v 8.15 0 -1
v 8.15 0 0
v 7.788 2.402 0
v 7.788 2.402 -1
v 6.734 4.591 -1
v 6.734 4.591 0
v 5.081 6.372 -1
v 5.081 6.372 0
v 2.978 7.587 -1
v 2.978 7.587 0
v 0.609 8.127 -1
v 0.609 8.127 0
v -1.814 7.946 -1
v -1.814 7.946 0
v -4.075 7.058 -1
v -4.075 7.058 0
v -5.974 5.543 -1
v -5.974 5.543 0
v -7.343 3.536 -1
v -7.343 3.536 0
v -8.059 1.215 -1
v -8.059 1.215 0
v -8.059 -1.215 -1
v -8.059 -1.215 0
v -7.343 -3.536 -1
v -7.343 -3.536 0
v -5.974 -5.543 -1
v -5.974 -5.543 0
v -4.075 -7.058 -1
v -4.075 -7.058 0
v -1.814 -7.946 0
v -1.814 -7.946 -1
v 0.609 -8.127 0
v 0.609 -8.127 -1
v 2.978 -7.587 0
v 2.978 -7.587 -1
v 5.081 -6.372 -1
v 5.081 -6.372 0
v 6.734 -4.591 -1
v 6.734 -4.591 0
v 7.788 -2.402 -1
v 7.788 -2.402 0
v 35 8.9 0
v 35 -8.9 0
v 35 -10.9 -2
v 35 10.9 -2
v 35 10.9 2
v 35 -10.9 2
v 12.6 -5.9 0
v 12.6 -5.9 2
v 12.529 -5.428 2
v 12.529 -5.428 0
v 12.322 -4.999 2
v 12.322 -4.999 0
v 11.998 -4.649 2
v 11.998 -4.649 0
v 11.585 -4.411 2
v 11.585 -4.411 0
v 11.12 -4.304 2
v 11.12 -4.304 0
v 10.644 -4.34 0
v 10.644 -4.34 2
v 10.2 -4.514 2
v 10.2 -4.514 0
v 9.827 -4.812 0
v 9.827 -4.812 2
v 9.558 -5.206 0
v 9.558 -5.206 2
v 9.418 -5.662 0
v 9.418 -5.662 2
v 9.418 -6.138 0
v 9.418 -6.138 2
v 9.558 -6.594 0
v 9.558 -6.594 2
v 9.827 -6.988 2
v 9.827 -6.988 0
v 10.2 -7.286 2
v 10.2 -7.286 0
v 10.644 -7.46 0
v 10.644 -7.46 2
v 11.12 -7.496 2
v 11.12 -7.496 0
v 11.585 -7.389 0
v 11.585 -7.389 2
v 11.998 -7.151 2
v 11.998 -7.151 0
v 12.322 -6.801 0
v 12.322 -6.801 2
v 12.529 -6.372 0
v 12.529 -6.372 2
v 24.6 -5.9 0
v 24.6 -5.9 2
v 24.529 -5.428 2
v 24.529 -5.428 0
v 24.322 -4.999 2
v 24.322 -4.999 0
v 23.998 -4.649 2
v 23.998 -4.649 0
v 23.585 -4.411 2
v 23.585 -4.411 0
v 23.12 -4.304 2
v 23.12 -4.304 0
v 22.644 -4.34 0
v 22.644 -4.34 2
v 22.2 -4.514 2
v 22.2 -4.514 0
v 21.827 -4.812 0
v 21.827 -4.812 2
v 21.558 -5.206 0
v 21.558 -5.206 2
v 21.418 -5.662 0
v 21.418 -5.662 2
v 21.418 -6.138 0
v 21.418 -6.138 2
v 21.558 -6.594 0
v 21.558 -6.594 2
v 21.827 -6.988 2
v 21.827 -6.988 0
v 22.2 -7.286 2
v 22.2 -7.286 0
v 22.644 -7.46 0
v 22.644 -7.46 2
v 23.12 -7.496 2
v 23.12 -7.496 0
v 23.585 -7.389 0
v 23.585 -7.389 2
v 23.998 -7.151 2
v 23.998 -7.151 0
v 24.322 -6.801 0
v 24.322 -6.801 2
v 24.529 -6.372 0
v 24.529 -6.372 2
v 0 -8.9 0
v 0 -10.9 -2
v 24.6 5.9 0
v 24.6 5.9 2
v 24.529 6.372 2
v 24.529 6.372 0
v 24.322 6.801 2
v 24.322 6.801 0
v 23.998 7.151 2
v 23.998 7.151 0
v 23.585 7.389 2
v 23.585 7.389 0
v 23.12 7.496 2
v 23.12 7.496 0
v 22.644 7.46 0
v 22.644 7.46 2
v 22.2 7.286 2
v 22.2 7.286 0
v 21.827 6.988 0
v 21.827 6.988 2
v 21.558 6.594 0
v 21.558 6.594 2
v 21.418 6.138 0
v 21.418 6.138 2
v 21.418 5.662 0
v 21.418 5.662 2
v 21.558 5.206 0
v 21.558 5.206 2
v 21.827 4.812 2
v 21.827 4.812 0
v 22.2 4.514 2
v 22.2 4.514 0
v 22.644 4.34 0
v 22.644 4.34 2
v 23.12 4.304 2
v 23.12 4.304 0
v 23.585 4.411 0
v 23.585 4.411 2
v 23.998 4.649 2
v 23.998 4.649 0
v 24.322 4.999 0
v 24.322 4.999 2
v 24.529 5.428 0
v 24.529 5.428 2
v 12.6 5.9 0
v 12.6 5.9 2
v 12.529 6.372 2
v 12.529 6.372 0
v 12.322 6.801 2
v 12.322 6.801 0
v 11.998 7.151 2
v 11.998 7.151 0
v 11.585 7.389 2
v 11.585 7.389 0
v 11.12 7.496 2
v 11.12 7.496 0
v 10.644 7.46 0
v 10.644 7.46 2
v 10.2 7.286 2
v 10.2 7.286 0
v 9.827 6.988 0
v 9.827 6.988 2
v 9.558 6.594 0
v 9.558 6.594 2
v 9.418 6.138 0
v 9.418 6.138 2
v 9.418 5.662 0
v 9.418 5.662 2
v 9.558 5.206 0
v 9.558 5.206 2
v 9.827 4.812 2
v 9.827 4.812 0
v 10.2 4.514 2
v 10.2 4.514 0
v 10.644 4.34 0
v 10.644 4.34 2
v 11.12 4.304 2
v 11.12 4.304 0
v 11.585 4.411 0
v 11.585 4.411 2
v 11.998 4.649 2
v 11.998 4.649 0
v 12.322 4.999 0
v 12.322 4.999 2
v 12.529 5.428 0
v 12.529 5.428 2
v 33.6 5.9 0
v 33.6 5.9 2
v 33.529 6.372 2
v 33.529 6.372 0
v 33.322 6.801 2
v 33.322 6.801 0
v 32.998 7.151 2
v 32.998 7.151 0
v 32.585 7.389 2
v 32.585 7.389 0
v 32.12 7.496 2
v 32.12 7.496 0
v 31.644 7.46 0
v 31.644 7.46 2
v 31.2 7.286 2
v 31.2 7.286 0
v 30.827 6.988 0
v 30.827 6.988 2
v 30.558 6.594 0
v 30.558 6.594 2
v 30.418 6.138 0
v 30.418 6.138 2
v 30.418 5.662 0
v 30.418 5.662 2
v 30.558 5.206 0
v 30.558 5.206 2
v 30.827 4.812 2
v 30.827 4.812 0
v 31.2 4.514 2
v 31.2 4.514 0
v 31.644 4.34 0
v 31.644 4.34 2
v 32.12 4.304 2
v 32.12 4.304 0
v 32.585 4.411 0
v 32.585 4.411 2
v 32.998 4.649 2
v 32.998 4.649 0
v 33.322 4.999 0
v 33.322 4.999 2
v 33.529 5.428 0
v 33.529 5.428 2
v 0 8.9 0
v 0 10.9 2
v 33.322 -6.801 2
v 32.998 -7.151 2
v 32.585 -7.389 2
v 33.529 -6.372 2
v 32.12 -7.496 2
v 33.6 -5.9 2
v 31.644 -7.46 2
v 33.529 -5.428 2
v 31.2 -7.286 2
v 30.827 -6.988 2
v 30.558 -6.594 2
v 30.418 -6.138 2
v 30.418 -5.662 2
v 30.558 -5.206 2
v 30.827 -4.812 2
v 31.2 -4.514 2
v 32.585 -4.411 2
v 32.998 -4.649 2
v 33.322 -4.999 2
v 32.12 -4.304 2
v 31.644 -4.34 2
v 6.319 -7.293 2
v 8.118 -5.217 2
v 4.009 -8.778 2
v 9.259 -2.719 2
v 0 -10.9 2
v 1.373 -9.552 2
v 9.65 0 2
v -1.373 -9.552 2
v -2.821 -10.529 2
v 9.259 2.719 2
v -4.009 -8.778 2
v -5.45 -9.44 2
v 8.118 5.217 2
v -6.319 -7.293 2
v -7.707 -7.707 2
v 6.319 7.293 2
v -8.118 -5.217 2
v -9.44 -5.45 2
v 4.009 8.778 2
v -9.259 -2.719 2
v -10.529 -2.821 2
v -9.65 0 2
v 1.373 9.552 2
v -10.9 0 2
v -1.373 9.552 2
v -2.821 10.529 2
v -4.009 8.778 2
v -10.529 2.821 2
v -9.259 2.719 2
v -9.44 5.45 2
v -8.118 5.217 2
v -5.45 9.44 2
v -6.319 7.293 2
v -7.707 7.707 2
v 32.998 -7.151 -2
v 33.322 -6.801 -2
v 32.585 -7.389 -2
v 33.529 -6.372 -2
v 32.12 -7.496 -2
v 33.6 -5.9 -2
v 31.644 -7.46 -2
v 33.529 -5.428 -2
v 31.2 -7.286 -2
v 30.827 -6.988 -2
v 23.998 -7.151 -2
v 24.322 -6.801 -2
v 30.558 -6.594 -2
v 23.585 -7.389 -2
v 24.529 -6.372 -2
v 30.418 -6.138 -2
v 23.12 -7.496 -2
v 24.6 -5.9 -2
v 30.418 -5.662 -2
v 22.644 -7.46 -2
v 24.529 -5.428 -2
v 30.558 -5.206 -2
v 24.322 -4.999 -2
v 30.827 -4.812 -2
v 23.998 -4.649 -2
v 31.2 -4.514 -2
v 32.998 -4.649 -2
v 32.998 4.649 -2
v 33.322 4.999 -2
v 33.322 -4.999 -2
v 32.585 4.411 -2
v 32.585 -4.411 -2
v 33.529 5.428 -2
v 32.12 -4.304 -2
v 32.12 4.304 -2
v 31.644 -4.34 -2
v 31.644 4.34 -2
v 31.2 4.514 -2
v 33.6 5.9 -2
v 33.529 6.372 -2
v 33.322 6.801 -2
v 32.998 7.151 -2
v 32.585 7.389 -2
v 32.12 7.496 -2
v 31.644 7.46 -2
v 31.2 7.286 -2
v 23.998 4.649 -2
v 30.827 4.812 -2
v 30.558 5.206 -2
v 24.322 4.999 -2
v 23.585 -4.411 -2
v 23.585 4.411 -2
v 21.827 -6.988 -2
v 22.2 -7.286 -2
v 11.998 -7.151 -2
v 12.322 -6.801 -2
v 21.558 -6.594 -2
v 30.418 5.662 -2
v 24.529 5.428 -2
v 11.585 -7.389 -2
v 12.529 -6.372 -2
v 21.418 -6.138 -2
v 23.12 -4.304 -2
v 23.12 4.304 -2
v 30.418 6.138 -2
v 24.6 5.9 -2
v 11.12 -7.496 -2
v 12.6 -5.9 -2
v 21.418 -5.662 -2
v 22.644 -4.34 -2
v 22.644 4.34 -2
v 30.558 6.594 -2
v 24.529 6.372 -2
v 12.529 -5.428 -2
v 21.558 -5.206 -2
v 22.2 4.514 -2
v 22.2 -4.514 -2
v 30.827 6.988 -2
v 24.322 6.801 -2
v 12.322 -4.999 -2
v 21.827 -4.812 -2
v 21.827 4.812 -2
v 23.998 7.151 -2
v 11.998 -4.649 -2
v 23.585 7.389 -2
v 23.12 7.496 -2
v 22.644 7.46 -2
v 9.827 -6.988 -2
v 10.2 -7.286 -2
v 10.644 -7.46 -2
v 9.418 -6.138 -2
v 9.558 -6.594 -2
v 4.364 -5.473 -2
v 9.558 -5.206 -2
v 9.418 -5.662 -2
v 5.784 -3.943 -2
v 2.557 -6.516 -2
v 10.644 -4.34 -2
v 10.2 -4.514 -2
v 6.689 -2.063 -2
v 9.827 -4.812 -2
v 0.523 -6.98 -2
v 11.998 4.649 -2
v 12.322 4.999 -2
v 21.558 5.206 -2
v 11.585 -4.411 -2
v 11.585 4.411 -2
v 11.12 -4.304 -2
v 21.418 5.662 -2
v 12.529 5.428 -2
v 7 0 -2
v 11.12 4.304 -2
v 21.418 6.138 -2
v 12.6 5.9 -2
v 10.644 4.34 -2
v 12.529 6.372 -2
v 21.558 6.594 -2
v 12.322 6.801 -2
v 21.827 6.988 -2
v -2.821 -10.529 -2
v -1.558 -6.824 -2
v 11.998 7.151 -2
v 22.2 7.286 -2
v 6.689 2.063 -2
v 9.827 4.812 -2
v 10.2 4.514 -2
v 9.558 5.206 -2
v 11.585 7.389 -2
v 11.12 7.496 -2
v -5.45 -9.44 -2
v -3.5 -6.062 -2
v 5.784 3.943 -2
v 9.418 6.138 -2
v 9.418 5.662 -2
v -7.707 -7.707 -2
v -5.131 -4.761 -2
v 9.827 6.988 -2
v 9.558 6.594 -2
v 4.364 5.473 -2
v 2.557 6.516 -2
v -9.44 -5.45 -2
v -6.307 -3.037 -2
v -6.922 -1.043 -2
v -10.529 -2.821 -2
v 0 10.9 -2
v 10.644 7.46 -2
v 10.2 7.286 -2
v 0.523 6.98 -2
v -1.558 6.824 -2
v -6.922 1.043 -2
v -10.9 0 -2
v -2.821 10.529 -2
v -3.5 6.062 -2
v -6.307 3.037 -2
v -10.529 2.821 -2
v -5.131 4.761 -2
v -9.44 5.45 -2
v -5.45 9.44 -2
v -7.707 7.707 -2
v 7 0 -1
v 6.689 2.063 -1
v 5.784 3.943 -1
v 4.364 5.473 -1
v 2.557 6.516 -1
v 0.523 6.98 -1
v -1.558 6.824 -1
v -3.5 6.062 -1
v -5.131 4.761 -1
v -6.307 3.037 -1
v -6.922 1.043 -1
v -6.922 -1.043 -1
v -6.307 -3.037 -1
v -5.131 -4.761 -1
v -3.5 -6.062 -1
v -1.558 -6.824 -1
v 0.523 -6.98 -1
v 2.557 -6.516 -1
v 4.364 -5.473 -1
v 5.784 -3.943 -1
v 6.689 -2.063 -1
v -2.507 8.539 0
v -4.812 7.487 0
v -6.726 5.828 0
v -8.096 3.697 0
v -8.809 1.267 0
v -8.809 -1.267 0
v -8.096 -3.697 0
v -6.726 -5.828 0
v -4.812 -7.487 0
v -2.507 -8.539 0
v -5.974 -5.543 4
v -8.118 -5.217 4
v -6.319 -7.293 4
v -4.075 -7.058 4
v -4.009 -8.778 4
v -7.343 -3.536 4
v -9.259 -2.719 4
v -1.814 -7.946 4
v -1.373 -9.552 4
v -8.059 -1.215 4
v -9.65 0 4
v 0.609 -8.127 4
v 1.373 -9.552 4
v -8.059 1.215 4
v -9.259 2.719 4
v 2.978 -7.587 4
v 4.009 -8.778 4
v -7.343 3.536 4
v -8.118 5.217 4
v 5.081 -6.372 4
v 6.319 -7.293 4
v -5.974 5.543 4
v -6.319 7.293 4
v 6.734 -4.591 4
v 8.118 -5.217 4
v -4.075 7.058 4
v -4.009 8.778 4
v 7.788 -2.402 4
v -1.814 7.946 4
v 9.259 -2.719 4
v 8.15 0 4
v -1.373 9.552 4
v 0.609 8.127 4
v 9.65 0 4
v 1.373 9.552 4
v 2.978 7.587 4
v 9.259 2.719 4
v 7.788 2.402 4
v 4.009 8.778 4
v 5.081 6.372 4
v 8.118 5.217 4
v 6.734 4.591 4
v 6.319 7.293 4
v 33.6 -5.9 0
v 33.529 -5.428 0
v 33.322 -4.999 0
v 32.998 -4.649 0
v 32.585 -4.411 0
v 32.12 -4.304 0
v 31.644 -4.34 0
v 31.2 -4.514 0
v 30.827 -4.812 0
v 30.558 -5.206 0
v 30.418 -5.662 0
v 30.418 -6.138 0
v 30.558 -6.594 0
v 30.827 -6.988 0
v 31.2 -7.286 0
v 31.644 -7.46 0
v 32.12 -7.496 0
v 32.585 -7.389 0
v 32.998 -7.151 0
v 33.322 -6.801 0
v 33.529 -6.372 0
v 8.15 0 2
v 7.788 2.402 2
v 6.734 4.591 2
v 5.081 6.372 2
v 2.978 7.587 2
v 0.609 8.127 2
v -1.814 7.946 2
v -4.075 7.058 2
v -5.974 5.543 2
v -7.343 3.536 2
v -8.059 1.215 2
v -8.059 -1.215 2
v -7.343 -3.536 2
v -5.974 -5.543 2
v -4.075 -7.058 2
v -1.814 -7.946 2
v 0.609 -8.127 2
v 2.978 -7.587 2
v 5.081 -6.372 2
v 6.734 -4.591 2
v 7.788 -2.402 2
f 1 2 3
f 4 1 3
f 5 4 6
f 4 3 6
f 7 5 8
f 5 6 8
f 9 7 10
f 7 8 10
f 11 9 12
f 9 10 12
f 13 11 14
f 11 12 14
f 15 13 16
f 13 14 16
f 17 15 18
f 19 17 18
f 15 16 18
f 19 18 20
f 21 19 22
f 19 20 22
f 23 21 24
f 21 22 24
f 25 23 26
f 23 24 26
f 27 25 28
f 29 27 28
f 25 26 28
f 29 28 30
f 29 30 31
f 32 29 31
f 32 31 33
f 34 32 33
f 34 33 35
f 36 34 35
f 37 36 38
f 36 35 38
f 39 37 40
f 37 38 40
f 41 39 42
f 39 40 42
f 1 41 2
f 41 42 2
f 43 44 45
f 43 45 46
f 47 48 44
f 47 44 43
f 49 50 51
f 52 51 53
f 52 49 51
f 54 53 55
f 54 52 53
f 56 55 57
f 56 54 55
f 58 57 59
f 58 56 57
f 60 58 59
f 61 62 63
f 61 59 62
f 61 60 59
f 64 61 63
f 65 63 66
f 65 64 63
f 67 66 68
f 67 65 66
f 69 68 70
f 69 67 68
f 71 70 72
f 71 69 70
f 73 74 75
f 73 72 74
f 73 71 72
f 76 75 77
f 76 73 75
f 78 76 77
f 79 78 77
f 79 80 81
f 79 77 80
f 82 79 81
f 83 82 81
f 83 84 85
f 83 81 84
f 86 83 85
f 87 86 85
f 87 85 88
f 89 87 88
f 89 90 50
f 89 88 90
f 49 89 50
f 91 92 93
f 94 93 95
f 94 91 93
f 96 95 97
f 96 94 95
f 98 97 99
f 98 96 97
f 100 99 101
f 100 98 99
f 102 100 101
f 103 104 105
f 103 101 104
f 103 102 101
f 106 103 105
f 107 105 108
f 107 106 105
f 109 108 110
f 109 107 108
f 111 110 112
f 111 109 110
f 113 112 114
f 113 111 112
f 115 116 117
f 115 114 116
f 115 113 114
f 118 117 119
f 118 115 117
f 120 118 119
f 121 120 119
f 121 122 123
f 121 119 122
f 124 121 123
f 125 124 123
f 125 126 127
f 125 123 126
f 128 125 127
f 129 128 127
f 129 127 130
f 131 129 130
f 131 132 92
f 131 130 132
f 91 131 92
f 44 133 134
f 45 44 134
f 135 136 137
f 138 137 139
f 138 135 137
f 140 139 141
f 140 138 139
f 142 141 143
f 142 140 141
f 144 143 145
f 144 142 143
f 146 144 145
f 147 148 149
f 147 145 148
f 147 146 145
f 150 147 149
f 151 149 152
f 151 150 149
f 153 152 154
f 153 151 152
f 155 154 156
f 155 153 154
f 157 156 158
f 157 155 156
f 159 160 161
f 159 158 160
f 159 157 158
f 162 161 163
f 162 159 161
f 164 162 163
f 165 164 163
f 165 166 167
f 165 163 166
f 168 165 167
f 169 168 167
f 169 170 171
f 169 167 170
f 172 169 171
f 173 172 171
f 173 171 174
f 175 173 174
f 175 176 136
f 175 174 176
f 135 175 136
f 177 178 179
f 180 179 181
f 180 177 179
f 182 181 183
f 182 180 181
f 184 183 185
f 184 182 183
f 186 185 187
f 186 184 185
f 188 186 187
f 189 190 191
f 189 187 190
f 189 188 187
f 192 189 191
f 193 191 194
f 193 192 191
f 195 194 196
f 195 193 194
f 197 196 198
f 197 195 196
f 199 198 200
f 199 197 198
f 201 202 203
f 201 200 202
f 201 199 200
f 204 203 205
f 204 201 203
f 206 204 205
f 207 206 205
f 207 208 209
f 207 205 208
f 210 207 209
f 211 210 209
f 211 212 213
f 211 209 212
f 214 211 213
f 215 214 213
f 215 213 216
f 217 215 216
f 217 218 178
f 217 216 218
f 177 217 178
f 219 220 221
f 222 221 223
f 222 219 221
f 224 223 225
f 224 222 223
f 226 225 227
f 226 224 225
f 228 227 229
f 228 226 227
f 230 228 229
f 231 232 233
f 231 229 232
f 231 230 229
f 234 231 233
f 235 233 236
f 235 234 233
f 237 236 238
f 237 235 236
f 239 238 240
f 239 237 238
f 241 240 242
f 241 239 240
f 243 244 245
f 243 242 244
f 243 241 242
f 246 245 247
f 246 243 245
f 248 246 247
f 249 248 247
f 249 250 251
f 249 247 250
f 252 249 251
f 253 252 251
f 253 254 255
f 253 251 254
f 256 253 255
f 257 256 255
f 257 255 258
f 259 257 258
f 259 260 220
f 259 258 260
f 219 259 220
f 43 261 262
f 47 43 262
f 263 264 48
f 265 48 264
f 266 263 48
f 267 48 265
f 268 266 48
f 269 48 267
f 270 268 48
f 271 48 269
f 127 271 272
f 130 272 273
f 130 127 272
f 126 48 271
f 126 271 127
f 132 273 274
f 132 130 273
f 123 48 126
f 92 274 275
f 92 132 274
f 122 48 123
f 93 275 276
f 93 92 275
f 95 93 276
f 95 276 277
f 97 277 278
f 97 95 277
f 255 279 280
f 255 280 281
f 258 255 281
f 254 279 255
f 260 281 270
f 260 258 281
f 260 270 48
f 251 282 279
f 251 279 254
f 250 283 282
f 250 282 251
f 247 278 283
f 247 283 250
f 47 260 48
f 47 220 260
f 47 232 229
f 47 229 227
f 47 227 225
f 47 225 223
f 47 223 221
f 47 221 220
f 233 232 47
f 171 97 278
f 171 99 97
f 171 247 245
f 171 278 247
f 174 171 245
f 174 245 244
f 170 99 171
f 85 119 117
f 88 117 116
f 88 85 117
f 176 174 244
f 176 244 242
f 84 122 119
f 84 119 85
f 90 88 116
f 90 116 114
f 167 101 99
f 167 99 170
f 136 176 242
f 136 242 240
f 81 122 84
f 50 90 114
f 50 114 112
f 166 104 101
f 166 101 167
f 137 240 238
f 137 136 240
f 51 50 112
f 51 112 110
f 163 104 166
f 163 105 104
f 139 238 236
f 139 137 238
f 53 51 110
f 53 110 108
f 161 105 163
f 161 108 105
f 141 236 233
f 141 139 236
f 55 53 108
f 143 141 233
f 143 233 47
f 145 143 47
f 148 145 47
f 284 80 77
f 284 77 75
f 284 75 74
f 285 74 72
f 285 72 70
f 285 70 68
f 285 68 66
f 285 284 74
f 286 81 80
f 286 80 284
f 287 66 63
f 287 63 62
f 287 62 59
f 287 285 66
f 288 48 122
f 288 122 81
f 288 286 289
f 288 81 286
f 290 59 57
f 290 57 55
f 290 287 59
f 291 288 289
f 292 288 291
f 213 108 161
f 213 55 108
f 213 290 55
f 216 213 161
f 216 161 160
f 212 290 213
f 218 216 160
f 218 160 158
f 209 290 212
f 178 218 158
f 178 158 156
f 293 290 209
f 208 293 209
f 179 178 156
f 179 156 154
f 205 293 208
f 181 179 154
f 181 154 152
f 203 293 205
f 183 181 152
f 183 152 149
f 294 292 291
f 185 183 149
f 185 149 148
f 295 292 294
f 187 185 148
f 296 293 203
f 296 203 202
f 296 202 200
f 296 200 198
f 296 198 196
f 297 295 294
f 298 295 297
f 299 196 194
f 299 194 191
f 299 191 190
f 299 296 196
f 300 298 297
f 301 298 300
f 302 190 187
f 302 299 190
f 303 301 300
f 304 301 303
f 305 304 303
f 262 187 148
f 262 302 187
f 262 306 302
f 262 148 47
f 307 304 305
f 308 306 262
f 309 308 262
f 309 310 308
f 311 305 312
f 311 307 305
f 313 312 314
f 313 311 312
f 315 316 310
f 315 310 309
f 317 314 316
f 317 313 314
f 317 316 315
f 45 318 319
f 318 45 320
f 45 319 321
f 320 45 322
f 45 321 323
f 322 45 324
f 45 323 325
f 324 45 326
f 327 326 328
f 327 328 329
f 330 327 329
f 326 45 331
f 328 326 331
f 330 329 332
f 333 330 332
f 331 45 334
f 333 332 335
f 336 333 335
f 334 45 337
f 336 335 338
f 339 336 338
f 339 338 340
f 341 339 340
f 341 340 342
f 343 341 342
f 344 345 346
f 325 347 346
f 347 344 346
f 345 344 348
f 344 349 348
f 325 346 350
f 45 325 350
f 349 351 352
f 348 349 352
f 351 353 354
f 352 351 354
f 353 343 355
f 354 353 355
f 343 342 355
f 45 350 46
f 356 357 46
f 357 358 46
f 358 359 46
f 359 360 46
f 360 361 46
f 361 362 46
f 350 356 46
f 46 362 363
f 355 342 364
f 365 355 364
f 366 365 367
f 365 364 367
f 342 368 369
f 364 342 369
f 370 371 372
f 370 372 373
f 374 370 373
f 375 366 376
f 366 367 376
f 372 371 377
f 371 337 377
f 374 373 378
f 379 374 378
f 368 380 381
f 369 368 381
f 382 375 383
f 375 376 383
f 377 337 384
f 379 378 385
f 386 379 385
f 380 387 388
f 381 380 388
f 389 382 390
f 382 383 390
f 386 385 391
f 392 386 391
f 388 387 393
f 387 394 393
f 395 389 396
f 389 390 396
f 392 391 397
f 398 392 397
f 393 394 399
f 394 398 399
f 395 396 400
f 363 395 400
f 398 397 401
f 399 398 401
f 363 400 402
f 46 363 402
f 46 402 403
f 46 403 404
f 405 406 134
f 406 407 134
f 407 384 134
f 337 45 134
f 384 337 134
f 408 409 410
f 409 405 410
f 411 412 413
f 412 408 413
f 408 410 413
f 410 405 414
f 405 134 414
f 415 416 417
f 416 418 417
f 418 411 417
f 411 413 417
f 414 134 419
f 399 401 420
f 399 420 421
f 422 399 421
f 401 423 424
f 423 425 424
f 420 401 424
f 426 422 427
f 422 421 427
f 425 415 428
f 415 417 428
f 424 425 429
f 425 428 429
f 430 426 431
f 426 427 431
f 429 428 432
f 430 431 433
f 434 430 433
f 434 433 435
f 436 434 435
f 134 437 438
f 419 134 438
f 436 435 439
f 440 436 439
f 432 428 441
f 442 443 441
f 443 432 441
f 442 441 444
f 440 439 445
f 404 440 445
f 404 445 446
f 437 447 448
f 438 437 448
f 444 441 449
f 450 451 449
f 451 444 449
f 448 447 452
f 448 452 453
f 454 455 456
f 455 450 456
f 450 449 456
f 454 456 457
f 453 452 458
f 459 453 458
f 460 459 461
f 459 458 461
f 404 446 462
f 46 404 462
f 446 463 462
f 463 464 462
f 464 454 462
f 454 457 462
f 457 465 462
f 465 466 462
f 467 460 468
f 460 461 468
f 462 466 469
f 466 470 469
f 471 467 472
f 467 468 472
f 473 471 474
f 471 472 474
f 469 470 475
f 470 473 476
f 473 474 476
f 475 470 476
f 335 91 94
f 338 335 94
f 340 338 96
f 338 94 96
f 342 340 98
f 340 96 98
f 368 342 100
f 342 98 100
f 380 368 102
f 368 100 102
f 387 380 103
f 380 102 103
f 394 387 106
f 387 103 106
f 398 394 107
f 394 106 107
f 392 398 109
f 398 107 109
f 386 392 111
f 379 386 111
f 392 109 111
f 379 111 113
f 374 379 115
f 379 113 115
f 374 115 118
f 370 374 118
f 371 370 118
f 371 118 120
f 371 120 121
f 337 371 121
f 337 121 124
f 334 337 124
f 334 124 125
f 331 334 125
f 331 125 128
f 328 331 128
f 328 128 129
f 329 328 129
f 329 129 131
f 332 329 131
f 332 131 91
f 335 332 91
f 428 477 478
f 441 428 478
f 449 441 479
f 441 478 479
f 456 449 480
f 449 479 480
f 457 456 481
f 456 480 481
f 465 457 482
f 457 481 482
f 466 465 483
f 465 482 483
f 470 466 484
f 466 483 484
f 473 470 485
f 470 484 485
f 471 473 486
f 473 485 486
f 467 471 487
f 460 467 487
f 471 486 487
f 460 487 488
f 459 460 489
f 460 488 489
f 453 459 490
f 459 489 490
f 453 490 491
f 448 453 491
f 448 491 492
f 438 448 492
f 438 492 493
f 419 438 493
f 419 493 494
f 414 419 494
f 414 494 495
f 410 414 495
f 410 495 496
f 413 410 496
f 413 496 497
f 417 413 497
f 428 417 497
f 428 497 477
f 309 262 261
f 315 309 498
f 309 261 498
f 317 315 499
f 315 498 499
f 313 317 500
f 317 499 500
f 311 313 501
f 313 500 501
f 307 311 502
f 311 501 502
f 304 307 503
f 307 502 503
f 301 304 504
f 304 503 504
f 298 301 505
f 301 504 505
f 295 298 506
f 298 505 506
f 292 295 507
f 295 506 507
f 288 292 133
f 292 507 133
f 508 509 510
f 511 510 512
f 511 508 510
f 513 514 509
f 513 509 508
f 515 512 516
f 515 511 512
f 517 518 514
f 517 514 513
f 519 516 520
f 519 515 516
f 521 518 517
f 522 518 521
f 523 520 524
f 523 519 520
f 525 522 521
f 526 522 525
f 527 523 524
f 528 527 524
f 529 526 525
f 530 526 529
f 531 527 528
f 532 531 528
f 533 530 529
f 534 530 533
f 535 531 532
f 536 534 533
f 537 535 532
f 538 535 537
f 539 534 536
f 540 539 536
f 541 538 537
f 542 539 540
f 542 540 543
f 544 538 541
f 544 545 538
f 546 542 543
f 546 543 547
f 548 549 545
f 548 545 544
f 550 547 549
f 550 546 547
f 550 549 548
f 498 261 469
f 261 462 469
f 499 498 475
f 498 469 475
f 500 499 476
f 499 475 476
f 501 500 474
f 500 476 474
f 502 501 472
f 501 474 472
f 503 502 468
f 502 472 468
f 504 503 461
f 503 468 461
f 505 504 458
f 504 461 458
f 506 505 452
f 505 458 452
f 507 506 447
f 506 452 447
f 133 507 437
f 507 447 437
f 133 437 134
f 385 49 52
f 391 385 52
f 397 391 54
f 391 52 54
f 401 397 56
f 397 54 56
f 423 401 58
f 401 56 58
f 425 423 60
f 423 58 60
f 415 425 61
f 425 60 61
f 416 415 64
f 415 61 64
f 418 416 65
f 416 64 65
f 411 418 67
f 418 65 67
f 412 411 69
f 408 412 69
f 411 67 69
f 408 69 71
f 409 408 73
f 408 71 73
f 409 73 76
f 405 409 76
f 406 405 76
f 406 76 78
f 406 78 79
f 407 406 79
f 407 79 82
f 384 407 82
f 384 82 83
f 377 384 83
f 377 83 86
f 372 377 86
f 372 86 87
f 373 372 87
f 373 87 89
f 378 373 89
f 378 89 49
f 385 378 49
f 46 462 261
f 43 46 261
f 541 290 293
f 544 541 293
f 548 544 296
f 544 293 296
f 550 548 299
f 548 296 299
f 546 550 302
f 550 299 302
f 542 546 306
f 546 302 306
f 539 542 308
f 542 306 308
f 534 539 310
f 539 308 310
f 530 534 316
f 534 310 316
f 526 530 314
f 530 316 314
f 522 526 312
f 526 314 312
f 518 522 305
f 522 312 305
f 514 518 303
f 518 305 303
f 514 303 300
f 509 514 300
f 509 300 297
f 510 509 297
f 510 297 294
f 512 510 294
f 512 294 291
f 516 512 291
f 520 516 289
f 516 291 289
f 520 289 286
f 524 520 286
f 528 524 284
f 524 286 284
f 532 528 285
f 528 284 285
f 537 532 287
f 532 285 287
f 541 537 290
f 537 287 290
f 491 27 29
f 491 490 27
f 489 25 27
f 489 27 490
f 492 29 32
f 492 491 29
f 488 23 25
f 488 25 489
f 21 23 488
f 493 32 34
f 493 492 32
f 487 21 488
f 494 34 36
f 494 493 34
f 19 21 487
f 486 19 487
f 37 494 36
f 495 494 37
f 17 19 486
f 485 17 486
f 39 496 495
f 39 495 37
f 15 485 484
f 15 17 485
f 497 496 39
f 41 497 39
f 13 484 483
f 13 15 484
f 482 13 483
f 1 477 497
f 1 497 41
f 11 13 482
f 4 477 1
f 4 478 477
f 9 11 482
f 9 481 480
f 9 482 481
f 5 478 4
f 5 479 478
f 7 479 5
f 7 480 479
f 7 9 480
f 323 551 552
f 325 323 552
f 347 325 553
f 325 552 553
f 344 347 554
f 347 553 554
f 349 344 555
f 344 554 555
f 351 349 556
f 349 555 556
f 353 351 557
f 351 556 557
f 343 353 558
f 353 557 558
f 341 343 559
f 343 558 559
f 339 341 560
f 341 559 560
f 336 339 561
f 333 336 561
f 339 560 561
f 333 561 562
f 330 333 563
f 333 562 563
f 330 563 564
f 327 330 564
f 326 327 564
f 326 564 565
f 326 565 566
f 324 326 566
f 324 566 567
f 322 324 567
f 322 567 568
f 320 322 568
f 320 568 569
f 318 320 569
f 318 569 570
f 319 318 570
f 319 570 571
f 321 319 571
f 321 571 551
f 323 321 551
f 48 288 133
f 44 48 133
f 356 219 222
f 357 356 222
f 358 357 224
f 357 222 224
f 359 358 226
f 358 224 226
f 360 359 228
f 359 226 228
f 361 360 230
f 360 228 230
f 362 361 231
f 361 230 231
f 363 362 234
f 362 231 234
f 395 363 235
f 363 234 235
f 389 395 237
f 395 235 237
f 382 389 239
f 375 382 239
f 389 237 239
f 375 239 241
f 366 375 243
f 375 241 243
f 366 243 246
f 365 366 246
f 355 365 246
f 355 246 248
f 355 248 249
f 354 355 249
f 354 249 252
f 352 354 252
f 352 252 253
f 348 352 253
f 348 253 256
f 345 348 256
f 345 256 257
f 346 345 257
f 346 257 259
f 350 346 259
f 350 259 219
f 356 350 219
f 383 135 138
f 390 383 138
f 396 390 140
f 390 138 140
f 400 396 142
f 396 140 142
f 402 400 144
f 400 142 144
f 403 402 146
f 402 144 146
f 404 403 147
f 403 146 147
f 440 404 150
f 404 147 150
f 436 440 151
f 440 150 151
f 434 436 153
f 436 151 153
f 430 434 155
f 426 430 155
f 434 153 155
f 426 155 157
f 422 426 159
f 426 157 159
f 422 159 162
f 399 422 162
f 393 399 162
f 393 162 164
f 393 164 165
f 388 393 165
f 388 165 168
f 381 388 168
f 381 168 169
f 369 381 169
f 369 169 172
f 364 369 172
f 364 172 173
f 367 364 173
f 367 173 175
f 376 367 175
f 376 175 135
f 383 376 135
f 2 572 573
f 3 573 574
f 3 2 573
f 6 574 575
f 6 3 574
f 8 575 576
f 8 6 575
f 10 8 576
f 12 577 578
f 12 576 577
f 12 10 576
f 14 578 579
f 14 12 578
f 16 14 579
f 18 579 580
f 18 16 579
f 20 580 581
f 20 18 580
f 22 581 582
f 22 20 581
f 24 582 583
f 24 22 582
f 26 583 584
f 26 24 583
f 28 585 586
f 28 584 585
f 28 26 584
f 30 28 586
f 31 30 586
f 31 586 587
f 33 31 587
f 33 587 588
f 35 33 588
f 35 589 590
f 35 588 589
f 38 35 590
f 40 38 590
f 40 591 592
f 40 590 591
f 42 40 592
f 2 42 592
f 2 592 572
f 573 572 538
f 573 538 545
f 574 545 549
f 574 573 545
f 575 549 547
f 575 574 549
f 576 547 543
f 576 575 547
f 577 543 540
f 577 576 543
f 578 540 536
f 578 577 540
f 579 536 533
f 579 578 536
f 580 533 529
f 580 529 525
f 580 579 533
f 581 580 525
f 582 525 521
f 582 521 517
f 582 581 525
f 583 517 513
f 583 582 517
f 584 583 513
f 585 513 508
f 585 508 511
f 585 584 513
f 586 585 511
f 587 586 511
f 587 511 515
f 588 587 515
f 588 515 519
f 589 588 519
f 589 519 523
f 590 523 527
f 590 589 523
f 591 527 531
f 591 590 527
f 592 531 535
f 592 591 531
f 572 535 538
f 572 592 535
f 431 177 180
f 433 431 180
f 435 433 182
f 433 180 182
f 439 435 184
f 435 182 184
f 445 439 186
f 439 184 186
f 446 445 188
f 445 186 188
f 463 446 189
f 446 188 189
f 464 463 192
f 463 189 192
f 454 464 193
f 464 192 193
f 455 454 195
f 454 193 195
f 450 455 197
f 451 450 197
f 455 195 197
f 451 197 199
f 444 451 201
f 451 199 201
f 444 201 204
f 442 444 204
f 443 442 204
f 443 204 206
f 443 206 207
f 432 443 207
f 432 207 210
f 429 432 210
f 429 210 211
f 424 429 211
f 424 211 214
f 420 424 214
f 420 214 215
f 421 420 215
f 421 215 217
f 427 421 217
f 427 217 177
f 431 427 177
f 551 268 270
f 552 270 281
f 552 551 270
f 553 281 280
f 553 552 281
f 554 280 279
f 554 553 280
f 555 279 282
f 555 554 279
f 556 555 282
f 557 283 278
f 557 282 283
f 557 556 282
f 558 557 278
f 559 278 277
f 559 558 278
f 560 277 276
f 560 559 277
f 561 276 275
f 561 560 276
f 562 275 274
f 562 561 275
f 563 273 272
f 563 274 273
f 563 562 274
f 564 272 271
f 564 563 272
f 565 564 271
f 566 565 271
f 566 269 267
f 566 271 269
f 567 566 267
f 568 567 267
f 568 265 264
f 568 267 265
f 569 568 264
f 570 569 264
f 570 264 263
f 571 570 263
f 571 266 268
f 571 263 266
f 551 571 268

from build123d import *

# Parameters (mm, degrees)
PAD_DEPTH            = 35
SKETCH004_R          = 1.6
POCKET_DEPTH         = 2.001
POCKET_DEPTH_BACK    = 2.001
SKETCH006_R          = 7
POCKET001_DEPTH      = 2.001
POCKET001_DEPTH_BACK = 2.001
SKETCH005_R          = 8.15
POCKET002_DEPTH      = 1
POCKET002_DEPTH_BACK = 100
SKETCH007_R          = 9.65
SKETCH007_R_2        = 8.15
PAD001_DEPTH         = 2


with BuildPart() as part:
    # Sketch → Pad (new body)
    with BuildSketch(Plane.YZ):
        Polygon((0, 2), (-10.9, 2), (-8.9, 0), (-10.9, -2), (0, -2), (10.9, -2), (8.9, 0), (10.9, 2), align=None)
    extrude(amount=PAD_DEPTH)

    # Sketch002 (on DatumPlane) → AdditiveLoft section 0
    with BuildSketch(Plane.XY.offset(2)):
        with BuildLine():
            ThreePointArc((0, 10.9), (-10.9, 0), (0, -10.9))
            Line((0, 10.9), (0, -10.9))
        make_face()
    # Sketch001 → AdditiveLoft section 1
    with BuildSketch(Plane.XY):
        with BuildLine():
            ThreePointArc((0, 8.9), (-8.9, 0), (0, -8.9))
            Line((0, 8.9), (0, -8.9))
        make_face()
    # Sketch003 (on DatumPlane) → AdditiveLoft section 2
    with BuildSketch(Plane.XY.offset(-2)):
        with BuildLine():
            ThreePointArc((0, 10.9), (-10.9, 0), (0, -10.9))
            Line((0, 10.9), (0, -10.9))
        make_face()
    loft(ruled=True)

    # Sketch004 → Pocket (cut, two sides)
    with BuildSketch(Plane.XY) as pocket_sk:
        with Locations((32, 5.9)):
            Circle(SKETCH004_R)
        with Locations((32, -5.9)):
            Circle(SKETCH004_R)
        with Locations((23, 5.9)):
            Circle(SKETCH004_R)
        with Locations((11, 5.9)):
            Circle(SKETCH004_R)
        with Locations((23, -5.9)):
            Circle(SKETCH004_R)
        with Locations((11, -5.9)):
            Circle(SKETCH004_R)
    extrude(amount=-POCKET_DEPTH, mode=Mode.SUBTRACT)
    extrude(pocket_sk.sketch, amount=POCKET_DEPTH_BACK, mode=Mode.SUBTRACT)

    # Sketch006 → Pocket001 (cut, two sides)
    with BuildSketch(Plane.XY) as pocket001_sk:
        Circle(SKETCH006_R)
    extrude(amount=-POCKET001_DEPTH, mode=Mode.SUBTRACT)
    extrude(pocket001_sk.sketch, amount=POCKET001_DEPTH_BACK, mode=Mode.SUBTRACT)

    # Sketch005 → Pocket002 (cut, two sides)
    with BuildSketch(Plane.XY) as pocket002_sk:
        Circle(SKETCH005_R)
    extrude(amount=-POCKET002_DEPTH, mode=Mode.SUBTRACT)
    extrude(pocket002_sk.sketch, amount=POCKET002_DEPTH_BACK, mode=Mode.SUBTRACT)

    # Sketch007 (on DatumPlane) → Pad001 (join)
    with BuildSketch(Plane.XY.offset(2)):
        Circle(SKETCH007_R)
        Circle(SKETCH007_R_2, mode=Mode.SUBTRACT)
    extrude(amount=PAD001_DEPTH)


solid = part.part
